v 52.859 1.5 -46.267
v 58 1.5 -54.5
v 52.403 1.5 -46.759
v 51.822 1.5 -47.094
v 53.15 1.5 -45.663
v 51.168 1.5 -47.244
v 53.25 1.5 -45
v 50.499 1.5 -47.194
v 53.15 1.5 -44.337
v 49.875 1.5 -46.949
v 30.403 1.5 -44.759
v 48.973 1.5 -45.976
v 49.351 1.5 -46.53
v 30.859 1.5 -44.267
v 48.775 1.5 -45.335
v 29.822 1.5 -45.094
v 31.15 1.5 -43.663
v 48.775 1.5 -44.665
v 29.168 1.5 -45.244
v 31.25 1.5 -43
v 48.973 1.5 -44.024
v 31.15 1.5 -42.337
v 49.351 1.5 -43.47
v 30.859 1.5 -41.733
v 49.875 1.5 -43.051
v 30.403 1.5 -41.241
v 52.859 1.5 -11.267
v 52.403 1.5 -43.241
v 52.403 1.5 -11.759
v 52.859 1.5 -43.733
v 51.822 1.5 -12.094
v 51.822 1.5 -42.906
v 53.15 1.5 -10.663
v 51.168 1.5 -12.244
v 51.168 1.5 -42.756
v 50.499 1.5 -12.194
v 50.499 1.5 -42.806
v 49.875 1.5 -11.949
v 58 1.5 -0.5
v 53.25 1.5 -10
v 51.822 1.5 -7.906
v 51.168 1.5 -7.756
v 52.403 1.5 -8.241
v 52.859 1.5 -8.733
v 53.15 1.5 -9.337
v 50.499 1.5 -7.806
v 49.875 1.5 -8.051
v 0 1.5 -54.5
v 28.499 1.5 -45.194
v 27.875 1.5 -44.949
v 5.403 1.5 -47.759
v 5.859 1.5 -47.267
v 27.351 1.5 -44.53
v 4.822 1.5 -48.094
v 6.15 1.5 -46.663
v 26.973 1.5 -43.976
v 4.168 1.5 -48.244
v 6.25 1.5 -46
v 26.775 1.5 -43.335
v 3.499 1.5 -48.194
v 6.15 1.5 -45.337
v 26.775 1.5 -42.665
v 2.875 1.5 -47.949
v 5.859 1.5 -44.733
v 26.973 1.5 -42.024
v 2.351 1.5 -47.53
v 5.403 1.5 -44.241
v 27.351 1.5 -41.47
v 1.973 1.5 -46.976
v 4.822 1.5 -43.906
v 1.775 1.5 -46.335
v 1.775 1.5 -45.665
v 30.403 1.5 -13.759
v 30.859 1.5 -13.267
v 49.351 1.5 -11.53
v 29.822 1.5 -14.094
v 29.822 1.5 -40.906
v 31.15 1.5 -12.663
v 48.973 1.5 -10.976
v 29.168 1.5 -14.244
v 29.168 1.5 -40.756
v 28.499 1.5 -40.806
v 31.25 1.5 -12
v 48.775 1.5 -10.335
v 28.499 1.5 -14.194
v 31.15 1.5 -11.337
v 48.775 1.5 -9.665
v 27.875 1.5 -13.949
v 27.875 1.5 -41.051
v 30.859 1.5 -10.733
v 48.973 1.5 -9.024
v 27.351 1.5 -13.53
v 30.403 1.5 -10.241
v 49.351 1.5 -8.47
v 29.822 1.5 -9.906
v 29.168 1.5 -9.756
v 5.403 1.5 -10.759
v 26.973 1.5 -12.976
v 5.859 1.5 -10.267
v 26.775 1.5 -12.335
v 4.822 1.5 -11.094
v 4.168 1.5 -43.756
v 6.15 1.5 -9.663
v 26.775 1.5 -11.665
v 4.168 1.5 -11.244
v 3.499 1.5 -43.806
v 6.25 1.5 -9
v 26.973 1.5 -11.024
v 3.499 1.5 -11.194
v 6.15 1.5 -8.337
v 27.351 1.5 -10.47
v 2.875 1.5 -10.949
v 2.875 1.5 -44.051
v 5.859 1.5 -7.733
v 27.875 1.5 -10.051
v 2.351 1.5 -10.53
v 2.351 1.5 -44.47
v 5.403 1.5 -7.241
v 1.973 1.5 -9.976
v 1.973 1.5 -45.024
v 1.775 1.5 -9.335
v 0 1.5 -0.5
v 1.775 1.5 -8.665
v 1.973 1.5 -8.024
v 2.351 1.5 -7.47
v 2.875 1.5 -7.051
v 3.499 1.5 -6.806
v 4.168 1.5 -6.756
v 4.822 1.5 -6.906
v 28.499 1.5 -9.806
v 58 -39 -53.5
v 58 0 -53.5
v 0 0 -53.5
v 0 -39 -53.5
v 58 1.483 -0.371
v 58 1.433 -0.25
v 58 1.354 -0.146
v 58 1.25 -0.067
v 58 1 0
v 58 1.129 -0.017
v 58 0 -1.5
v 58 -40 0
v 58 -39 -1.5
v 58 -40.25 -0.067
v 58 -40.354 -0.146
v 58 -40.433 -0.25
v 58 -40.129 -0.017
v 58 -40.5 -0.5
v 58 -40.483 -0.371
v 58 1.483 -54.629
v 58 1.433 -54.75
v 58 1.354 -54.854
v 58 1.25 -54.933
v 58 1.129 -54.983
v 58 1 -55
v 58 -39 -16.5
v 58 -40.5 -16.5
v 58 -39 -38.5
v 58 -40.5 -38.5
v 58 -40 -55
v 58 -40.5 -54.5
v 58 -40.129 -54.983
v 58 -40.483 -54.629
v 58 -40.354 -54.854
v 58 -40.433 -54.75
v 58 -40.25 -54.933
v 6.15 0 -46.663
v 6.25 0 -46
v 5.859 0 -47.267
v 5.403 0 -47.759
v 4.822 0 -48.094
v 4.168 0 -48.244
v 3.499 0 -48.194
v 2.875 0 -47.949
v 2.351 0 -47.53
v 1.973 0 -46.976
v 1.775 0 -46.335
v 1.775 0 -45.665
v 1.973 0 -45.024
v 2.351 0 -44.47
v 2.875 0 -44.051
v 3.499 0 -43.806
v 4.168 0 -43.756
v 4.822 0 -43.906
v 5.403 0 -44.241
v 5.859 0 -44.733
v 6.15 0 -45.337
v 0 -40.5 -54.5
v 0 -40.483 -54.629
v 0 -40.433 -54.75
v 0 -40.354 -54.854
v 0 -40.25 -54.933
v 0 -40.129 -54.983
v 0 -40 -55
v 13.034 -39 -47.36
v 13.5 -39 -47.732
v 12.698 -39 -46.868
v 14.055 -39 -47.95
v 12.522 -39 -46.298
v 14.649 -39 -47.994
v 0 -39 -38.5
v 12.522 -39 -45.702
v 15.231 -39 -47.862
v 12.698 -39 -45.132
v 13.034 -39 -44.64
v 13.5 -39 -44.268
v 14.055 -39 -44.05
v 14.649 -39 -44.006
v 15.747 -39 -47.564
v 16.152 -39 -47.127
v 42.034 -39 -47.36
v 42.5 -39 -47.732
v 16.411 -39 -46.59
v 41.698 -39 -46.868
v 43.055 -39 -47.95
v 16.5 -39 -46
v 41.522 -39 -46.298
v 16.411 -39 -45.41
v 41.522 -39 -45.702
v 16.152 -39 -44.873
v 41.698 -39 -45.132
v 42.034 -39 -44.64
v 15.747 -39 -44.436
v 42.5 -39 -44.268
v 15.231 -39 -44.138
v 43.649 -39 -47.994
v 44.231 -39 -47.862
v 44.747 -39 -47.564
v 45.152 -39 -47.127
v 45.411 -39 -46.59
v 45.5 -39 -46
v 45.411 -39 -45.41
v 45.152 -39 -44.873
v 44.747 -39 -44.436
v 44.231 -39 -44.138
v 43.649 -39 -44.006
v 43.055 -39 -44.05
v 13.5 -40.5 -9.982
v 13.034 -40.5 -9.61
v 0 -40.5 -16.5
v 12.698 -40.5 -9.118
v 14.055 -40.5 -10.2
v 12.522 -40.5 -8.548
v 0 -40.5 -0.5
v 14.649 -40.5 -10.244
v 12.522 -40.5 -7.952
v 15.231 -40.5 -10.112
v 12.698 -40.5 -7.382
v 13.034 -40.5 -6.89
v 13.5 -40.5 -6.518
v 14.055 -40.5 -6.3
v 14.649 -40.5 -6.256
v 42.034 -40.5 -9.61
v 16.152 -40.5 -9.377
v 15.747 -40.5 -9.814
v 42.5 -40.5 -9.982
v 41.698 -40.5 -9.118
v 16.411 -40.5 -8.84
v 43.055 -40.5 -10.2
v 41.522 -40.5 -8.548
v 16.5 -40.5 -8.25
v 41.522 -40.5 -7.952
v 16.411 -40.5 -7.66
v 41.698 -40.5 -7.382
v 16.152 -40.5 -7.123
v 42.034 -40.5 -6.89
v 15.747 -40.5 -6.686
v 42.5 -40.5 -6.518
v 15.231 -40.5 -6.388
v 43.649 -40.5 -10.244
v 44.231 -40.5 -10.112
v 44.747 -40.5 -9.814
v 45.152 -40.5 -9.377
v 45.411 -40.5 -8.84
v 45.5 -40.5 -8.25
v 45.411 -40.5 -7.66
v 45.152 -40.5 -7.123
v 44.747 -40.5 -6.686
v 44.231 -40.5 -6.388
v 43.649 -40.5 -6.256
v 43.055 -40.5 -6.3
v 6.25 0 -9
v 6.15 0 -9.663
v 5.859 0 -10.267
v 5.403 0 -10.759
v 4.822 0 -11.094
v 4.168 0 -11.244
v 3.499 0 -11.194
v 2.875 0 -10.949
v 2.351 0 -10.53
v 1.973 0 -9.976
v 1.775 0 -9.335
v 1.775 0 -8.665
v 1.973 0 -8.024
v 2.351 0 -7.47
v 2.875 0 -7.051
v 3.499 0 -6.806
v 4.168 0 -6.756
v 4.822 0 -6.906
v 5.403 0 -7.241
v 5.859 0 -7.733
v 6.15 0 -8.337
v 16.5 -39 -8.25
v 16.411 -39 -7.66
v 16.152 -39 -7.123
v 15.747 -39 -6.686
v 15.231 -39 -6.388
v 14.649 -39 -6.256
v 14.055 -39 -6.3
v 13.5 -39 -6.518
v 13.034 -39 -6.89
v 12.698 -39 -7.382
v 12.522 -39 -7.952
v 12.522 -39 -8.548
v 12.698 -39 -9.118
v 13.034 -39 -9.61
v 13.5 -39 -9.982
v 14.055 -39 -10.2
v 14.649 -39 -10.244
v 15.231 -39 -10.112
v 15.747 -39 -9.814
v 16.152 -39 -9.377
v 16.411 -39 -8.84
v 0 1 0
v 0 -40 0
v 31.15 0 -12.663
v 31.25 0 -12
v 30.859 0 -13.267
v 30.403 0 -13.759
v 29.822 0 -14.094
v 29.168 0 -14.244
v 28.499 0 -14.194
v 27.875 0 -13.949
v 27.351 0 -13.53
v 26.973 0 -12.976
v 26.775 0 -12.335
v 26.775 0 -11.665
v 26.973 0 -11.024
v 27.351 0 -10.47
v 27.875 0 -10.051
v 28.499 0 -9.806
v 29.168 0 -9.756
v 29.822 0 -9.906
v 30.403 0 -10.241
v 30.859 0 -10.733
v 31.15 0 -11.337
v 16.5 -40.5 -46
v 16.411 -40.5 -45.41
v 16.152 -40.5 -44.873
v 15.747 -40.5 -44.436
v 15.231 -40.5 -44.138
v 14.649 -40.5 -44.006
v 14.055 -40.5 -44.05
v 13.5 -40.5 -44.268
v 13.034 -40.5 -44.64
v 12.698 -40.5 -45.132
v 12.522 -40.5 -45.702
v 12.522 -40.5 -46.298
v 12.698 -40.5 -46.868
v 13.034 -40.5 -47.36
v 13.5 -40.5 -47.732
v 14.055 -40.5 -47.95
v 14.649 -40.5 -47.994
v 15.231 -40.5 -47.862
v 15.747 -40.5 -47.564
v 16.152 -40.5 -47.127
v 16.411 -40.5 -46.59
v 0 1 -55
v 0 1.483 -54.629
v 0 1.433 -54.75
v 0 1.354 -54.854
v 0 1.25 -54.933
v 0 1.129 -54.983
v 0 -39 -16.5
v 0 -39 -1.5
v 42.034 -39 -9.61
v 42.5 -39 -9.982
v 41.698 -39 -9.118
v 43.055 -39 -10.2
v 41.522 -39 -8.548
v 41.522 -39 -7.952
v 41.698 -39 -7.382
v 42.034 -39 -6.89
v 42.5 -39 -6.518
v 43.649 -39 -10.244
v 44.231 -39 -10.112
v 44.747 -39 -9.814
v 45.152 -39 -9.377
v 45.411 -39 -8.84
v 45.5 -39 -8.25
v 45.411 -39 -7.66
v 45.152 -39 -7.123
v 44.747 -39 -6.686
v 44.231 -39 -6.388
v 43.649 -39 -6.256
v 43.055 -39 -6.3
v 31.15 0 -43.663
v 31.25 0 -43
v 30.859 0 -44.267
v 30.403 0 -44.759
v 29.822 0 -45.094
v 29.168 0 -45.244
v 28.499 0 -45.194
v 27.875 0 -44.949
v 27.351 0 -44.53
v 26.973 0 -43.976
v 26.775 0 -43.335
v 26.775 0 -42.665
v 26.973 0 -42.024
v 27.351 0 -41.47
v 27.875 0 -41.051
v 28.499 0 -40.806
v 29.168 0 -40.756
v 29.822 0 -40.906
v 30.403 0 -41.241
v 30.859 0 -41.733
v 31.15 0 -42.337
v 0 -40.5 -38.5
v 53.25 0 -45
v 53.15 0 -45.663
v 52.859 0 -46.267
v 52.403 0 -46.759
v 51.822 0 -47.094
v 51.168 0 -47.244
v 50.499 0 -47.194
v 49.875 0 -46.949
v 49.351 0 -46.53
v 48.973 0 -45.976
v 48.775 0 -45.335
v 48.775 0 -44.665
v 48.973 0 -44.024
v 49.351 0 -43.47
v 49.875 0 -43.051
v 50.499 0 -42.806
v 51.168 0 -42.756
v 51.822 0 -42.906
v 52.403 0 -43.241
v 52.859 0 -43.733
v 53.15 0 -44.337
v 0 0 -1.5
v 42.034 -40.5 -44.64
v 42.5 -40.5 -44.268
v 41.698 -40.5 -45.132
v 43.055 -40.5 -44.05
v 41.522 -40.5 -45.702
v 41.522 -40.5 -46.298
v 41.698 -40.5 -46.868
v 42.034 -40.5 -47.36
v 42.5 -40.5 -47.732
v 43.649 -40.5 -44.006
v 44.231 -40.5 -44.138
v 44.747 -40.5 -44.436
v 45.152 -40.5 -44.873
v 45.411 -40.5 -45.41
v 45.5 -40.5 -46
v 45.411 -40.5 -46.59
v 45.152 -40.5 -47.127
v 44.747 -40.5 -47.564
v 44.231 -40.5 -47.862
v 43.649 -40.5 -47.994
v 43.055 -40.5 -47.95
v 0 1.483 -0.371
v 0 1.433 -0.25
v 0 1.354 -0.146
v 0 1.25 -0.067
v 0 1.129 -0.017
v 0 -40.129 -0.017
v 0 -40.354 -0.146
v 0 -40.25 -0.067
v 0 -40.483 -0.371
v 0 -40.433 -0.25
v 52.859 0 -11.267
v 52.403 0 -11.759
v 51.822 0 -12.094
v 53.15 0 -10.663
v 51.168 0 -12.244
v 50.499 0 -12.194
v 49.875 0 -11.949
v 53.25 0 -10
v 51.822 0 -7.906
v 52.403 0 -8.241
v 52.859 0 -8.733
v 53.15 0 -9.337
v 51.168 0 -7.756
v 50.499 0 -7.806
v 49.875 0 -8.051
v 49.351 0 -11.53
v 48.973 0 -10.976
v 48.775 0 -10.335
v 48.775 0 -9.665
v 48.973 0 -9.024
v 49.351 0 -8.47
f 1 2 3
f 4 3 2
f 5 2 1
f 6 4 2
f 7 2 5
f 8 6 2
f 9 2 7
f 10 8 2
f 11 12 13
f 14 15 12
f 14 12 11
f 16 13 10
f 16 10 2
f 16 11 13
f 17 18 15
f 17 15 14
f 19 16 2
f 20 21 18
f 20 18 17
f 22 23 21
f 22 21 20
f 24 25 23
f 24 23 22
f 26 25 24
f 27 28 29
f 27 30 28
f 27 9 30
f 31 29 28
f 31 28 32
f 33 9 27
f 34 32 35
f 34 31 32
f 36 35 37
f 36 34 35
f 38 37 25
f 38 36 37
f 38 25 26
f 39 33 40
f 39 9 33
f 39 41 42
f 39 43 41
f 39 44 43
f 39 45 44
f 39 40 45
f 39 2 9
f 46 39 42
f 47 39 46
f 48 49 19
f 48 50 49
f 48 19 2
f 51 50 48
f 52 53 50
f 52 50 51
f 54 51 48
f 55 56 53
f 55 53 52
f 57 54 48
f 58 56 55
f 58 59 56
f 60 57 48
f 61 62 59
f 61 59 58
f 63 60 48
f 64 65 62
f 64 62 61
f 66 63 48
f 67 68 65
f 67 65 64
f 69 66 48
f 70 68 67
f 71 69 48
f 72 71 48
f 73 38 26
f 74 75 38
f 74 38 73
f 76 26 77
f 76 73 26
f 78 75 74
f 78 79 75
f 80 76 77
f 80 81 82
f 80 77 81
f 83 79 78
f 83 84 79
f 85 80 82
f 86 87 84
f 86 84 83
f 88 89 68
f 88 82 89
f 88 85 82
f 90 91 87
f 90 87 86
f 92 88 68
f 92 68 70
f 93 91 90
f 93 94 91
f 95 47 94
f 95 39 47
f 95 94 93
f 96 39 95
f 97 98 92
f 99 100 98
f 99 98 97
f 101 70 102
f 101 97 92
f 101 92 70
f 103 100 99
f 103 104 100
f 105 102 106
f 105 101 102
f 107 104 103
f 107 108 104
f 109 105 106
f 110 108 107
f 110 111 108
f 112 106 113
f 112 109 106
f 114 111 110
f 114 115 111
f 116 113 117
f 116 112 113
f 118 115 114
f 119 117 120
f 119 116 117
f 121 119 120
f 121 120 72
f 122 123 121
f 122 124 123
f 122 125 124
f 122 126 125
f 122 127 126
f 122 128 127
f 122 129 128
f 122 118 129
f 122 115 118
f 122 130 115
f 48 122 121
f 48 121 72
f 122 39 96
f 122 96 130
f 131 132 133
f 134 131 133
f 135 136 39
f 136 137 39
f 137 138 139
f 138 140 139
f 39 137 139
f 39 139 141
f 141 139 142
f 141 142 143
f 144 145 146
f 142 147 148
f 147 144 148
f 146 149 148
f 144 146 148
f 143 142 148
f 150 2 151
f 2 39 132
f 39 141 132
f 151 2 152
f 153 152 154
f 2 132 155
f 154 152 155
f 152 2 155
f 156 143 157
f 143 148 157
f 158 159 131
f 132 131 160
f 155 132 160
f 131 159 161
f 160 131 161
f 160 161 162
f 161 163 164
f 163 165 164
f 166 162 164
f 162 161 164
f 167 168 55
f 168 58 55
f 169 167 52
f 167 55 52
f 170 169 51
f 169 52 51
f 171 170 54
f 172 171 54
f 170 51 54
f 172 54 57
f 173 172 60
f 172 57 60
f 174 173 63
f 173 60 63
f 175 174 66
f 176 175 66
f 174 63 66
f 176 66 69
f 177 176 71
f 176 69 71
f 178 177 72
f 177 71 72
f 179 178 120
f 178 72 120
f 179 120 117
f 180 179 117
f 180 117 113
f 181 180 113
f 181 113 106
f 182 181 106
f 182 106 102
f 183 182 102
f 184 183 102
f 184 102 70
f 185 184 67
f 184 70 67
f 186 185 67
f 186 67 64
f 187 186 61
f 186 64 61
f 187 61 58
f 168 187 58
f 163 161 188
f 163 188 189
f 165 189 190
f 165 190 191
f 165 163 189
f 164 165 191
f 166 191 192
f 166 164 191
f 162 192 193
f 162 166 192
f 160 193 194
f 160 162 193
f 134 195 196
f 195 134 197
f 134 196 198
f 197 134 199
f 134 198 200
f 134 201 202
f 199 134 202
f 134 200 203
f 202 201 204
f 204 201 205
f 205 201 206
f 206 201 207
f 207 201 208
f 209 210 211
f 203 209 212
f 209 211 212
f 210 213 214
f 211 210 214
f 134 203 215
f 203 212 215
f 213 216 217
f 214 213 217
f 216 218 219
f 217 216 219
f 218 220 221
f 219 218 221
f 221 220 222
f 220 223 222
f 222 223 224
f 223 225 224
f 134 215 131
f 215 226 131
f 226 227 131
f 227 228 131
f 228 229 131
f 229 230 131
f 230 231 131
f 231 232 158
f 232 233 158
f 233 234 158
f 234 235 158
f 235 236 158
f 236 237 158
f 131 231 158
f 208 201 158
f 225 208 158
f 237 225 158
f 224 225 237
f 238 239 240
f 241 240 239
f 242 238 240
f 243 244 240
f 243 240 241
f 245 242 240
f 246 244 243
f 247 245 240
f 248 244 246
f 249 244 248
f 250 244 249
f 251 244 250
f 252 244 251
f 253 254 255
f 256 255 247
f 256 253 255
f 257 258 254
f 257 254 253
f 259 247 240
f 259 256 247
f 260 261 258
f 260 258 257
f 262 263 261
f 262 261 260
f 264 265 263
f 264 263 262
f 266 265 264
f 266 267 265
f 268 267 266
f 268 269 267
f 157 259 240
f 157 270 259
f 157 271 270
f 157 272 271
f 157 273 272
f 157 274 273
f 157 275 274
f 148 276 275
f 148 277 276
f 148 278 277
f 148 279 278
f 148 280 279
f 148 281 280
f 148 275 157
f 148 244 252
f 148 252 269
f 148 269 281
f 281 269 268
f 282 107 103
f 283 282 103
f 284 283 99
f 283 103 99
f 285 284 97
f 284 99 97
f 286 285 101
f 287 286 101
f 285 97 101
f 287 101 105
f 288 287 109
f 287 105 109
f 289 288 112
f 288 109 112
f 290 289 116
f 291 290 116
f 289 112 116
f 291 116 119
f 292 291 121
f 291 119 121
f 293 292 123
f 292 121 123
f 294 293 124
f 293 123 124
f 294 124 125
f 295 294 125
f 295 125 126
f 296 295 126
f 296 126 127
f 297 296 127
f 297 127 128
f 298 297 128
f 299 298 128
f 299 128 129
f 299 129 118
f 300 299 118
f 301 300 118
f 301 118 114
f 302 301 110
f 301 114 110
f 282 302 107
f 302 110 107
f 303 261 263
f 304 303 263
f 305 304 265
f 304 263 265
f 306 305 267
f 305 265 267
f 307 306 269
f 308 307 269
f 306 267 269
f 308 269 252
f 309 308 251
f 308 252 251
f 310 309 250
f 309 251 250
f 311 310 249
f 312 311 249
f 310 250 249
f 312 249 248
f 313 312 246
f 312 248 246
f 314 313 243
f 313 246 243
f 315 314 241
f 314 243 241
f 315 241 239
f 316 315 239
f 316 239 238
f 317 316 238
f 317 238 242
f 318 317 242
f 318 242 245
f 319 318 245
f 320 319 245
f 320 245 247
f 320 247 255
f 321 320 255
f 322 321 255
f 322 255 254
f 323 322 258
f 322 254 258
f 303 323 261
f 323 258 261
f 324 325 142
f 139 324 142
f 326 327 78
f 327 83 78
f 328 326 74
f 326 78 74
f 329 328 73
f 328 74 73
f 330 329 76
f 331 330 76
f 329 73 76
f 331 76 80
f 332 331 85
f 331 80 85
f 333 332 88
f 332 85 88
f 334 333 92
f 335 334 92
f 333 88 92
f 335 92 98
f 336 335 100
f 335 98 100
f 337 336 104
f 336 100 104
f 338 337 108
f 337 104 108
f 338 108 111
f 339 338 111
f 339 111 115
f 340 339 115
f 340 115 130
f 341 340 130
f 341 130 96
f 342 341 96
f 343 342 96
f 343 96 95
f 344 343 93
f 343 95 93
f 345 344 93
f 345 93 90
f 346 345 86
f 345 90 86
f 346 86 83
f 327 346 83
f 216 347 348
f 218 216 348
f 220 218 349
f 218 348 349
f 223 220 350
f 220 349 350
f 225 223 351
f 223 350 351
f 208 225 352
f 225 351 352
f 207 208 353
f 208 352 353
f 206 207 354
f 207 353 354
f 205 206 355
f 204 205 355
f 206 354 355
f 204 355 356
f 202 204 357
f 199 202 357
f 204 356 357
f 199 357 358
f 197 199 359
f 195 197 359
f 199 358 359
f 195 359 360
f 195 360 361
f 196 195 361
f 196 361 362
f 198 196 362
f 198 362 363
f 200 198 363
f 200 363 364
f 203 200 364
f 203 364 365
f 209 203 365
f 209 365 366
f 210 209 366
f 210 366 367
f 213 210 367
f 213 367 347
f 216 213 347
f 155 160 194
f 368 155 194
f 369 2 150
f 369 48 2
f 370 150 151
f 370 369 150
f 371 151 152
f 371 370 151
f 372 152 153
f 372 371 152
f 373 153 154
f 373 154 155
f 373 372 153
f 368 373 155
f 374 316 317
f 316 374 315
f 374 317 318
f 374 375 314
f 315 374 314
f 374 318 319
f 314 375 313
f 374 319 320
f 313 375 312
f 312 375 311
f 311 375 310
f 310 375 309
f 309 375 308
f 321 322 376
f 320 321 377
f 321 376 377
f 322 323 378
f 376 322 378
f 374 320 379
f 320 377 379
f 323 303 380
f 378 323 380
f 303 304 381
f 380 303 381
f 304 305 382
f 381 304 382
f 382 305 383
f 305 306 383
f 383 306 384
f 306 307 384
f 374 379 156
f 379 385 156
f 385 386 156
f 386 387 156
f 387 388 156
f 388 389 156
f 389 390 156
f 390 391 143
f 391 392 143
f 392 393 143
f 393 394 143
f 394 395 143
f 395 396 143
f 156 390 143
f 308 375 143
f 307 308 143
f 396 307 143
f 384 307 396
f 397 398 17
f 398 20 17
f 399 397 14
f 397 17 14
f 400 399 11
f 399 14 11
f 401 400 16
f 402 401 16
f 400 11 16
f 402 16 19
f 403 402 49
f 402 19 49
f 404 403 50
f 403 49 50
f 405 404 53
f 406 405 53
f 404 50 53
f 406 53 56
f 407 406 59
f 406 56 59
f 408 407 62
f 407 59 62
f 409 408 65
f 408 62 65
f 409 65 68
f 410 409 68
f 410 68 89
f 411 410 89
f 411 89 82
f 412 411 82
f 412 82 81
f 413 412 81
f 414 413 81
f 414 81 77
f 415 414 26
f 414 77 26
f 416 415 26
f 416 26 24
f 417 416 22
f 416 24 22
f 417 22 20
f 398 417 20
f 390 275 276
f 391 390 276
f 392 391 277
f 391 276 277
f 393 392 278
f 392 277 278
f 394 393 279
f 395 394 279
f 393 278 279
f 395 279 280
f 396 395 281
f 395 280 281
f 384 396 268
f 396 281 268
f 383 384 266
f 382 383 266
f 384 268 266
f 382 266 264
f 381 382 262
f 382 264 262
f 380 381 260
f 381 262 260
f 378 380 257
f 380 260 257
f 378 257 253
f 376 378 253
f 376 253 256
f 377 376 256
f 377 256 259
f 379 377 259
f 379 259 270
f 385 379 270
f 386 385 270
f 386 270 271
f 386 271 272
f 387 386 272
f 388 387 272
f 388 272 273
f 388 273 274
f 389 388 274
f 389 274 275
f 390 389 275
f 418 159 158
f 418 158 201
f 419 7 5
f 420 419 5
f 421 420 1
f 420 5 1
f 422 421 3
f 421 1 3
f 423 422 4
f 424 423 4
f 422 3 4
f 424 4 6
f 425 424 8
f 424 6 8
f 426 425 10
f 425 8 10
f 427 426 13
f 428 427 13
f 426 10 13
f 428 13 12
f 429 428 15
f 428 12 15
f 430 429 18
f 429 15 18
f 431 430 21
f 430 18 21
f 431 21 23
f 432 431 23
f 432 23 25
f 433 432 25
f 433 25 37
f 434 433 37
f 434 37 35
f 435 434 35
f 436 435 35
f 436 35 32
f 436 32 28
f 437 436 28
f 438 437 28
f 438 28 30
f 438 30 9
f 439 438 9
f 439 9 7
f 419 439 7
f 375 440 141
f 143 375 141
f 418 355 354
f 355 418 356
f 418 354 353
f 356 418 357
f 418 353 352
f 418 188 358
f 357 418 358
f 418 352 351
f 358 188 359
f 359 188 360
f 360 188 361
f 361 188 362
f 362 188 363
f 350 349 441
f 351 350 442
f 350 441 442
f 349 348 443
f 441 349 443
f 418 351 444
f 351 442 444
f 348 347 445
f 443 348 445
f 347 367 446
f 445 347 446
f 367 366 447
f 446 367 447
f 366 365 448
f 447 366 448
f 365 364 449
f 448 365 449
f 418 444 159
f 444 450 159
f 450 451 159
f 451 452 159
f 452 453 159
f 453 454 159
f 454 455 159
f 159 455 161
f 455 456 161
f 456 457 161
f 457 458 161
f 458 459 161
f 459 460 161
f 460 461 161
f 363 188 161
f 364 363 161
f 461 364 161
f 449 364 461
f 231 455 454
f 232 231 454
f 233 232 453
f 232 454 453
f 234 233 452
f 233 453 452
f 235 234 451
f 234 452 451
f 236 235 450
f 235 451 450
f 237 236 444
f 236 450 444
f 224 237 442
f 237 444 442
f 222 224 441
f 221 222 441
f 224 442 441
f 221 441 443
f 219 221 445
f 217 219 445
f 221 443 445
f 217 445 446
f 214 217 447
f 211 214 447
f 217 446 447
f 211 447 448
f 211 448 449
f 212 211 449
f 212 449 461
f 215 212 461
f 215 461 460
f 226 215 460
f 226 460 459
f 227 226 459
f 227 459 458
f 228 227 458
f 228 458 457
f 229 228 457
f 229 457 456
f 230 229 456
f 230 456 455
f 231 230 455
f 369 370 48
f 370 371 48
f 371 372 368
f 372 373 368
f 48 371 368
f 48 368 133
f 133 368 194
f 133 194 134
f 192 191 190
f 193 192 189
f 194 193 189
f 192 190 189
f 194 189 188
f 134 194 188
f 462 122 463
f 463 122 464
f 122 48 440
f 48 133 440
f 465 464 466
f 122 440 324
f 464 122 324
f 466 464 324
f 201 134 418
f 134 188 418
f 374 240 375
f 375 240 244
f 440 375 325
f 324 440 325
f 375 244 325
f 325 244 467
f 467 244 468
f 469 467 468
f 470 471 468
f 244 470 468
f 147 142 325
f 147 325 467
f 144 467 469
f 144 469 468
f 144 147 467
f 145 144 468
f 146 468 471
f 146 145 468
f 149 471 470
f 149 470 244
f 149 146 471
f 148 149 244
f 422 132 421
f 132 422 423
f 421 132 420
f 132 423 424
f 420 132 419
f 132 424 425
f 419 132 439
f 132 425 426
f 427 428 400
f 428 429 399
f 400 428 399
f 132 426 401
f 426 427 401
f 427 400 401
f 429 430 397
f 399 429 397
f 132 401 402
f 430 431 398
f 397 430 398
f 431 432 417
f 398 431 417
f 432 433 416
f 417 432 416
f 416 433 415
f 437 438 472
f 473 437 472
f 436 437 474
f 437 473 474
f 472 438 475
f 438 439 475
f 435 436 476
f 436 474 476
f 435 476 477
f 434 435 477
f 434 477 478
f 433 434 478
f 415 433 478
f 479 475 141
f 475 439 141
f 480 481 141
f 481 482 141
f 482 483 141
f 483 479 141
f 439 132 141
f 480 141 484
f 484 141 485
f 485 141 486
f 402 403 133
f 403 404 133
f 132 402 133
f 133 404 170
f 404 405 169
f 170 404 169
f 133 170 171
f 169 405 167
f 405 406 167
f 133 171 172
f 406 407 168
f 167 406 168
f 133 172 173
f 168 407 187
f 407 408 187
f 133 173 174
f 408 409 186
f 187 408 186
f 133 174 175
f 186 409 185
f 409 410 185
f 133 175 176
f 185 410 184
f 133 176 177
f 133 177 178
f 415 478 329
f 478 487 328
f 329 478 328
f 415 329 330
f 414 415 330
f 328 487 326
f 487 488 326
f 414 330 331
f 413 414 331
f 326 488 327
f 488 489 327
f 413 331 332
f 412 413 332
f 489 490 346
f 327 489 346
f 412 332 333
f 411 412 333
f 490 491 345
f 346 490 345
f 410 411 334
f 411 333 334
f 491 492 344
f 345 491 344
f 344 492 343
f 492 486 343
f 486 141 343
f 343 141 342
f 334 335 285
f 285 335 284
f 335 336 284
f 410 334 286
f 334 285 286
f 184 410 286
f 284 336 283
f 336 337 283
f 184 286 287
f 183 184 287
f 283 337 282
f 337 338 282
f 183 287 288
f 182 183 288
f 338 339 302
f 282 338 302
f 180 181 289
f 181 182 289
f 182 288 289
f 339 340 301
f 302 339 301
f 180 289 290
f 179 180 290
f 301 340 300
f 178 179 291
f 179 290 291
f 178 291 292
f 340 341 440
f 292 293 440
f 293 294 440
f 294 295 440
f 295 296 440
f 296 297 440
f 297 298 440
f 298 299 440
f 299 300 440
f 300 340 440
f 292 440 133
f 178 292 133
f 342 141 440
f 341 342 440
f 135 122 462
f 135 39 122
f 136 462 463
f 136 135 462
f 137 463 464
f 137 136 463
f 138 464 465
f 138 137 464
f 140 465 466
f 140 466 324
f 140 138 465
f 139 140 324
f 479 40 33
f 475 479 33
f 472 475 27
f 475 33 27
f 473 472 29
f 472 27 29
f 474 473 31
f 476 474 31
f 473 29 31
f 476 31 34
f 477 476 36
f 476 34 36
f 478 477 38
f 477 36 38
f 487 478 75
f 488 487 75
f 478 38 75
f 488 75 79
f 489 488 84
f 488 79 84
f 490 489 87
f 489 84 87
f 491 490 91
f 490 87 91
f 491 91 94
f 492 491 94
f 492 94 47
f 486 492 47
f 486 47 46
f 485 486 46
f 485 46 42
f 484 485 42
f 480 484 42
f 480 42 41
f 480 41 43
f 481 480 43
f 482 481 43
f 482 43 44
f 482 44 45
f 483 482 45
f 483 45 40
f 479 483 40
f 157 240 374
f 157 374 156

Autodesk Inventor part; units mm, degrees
ref_plane "YZ Plane" through (0, 0, 0) normal (1, 0, 0) x (0, 1, 0)
ref_plane "XZ Plane" through (0, 0, 0) normal (0, 1, 0) x (-1, 0, 0)
ref_plane "XY Plane" through (0, 0, 0) normal (0, 0, 1) x (1, 0, 0)
sketch "Boceto1" plane through (0, 0, 0) normal (0, 1, 0) x (-1, 0, 0)
  line L0 (0, 0) -> (-58, 0)
  line L1 (-58, 0) -> (-58, -55)
  line L2 (-58, -55) -> (0, -55)
  line L3 (0, -55) -> (0, 0)
  line L4 (0, -55) -> (-58, -55)
  dimension "d0" = 58
  dimension "d1" = 55
extrude "Extrusión1" add sketch "Boceto1" along normal blind 1.5
sketch "Boceto3" plane through (0, 0, 0) normal (0, 0, 1) x (1, 0, 0)
  line L0 (0, 1.5) -> (58, 1.5) projected
  line L1 (58, 1.5) -> (0, 1.5)
  line L2 (0, 1.5) -> (0, -40.5)
  line L3 (0, -40.5) -> (58, -40.5)
  line L4 (58, -40.5) -> (58, 1.5)
  point P0 (0, 0)
  dimension "d8" = 58
  dimension "d9" = 42
sketch "Boceto4" plane through (58, 0, -55) normal (0, 0, -1) x (-1, 0, 0)
  line L0 (58, 1.5) -> (0, 1.5) projected
  line L1 (0, 1.5) -> (58, 1.5)
  line L2 (58, 1.5) -> (58, -40.5)
  line L3 (58, -40.5) -> (0, -40.5)
  line L4 (0, -40.5) -> (0, 1.5)
  point P0 (58, 0)
  dimension "d10" = 42
extrude "Extrusión2" add sketch "Boceto4" against normal blind 1.5
extrude "Extrusión3" add sketch "Boceto3" against normal blind 1.5
sketch "Boceto6" plane through (0, -40.5, 0) normal (0, -1, 0) x (1, 0, 0)
  line L0 (58, 0) -> (58, -1.5) projected
  line L1 (58, -1.5) -> (0, -1.5)
  line L2 (58, -1.5) -> (0, -1.5)
  line L3 (0, -1.5) -> (0, -16.5)
  line L4 (0, -16.5) -> (58, -16.5)
  line L5 (58, -16.5) -> (58, -1.5)
  line L6 (58, -55) -> (0, -55)
  line L7 (58, -40) -> (58, -55)
  line L8 (0, -53.5) -> (58, -53.5)
  line L9 (58, -53.5) -> (58, -38.5)
  line L10 (58, -38.5) -> (0, -38.5)
  line L11 (0, -38.5) -> (0, -53.5)
  point P0 (0, 0)
  dimension "d17" = 15
  dimension "d50" = 15
  dimension "d51" = 58
  dimension "d61" = 58
  dimension "d62" = 15
extrude "Extrusión4" add sketch "Boceto6" against normal blind 1.5
sketch "Boceto7" plane through (0, -40.5, 0) normal (0, -1, 0) x (1, 0, 0)
  line L0 (58, 0) -> (58, -16.5) projected
  line L1 (0, 0) -> (0, -16.5) projected
  line L2 (58, -55) -> (58, -38.5) projected
  circle A0 centre (43.5, -8.25) radius 2
  circle A1 centre (14.5, -8.25) radius 2
  line L3 (0, -53.5) -> (0, -38.5) projected
  line L4 (0, -46) -> (58, -46)
  line L5 (58, -38.5) -> (58, -53.5) projected
  circle A2 centre (43.5, -46) radius 2
  circle A3 centre (14.5, -46) radius 2
  point P0 (58, -40)
  dimension "d23" = 4
  dimension "d25" = 4
  dimension "d63" = 4
  dimension "d64" = 4
extrude "Extrusión5" cut sketch "Boceto7" against normal blind 1.5
sketch "Boceto8" plane through (0, 1.5, 0) normal (0, 1, 0) x (1, 0, 0)
  line L0 (58, 0) -> (58, 55) projected
  line L1 (58, 1.5) -> (58, 53.5) projected
  line L2 (58, 45) -> (51, 45)
  circle A0 centre (51, 45) radius 2.25
  circle A1 centre (51, 10) radius 2.25
  circle A2 centre (4, 9) radius 2.25
  circle A3 centre (4, 46) radius 2.25
  circle A4 centre (29, 12) radius 2.25
  circle A5 centre (29, 43) radius 2.25
  point P0 (0, 0)
  point P1 (0, 55)
  dimension "d32" = 7
  dimension "d33" = 4.5
  dimension "d34" = 4.5
  dimension "d39" = 4.5
  dimension "d40" = 4.5
  dimension "d45" = 4.5
  dimension "d47" = 4.5
extrude "Extrusión7" cut sketch "Boceto8" against normal blind 1.5
fillet "Empalme1" radius 0.5 4 edges at (29, 1.5, -55) (29, -40.5, -55) (29, -40.5, 0) (29, 1.5, 0)
properties part number "suport motor"
